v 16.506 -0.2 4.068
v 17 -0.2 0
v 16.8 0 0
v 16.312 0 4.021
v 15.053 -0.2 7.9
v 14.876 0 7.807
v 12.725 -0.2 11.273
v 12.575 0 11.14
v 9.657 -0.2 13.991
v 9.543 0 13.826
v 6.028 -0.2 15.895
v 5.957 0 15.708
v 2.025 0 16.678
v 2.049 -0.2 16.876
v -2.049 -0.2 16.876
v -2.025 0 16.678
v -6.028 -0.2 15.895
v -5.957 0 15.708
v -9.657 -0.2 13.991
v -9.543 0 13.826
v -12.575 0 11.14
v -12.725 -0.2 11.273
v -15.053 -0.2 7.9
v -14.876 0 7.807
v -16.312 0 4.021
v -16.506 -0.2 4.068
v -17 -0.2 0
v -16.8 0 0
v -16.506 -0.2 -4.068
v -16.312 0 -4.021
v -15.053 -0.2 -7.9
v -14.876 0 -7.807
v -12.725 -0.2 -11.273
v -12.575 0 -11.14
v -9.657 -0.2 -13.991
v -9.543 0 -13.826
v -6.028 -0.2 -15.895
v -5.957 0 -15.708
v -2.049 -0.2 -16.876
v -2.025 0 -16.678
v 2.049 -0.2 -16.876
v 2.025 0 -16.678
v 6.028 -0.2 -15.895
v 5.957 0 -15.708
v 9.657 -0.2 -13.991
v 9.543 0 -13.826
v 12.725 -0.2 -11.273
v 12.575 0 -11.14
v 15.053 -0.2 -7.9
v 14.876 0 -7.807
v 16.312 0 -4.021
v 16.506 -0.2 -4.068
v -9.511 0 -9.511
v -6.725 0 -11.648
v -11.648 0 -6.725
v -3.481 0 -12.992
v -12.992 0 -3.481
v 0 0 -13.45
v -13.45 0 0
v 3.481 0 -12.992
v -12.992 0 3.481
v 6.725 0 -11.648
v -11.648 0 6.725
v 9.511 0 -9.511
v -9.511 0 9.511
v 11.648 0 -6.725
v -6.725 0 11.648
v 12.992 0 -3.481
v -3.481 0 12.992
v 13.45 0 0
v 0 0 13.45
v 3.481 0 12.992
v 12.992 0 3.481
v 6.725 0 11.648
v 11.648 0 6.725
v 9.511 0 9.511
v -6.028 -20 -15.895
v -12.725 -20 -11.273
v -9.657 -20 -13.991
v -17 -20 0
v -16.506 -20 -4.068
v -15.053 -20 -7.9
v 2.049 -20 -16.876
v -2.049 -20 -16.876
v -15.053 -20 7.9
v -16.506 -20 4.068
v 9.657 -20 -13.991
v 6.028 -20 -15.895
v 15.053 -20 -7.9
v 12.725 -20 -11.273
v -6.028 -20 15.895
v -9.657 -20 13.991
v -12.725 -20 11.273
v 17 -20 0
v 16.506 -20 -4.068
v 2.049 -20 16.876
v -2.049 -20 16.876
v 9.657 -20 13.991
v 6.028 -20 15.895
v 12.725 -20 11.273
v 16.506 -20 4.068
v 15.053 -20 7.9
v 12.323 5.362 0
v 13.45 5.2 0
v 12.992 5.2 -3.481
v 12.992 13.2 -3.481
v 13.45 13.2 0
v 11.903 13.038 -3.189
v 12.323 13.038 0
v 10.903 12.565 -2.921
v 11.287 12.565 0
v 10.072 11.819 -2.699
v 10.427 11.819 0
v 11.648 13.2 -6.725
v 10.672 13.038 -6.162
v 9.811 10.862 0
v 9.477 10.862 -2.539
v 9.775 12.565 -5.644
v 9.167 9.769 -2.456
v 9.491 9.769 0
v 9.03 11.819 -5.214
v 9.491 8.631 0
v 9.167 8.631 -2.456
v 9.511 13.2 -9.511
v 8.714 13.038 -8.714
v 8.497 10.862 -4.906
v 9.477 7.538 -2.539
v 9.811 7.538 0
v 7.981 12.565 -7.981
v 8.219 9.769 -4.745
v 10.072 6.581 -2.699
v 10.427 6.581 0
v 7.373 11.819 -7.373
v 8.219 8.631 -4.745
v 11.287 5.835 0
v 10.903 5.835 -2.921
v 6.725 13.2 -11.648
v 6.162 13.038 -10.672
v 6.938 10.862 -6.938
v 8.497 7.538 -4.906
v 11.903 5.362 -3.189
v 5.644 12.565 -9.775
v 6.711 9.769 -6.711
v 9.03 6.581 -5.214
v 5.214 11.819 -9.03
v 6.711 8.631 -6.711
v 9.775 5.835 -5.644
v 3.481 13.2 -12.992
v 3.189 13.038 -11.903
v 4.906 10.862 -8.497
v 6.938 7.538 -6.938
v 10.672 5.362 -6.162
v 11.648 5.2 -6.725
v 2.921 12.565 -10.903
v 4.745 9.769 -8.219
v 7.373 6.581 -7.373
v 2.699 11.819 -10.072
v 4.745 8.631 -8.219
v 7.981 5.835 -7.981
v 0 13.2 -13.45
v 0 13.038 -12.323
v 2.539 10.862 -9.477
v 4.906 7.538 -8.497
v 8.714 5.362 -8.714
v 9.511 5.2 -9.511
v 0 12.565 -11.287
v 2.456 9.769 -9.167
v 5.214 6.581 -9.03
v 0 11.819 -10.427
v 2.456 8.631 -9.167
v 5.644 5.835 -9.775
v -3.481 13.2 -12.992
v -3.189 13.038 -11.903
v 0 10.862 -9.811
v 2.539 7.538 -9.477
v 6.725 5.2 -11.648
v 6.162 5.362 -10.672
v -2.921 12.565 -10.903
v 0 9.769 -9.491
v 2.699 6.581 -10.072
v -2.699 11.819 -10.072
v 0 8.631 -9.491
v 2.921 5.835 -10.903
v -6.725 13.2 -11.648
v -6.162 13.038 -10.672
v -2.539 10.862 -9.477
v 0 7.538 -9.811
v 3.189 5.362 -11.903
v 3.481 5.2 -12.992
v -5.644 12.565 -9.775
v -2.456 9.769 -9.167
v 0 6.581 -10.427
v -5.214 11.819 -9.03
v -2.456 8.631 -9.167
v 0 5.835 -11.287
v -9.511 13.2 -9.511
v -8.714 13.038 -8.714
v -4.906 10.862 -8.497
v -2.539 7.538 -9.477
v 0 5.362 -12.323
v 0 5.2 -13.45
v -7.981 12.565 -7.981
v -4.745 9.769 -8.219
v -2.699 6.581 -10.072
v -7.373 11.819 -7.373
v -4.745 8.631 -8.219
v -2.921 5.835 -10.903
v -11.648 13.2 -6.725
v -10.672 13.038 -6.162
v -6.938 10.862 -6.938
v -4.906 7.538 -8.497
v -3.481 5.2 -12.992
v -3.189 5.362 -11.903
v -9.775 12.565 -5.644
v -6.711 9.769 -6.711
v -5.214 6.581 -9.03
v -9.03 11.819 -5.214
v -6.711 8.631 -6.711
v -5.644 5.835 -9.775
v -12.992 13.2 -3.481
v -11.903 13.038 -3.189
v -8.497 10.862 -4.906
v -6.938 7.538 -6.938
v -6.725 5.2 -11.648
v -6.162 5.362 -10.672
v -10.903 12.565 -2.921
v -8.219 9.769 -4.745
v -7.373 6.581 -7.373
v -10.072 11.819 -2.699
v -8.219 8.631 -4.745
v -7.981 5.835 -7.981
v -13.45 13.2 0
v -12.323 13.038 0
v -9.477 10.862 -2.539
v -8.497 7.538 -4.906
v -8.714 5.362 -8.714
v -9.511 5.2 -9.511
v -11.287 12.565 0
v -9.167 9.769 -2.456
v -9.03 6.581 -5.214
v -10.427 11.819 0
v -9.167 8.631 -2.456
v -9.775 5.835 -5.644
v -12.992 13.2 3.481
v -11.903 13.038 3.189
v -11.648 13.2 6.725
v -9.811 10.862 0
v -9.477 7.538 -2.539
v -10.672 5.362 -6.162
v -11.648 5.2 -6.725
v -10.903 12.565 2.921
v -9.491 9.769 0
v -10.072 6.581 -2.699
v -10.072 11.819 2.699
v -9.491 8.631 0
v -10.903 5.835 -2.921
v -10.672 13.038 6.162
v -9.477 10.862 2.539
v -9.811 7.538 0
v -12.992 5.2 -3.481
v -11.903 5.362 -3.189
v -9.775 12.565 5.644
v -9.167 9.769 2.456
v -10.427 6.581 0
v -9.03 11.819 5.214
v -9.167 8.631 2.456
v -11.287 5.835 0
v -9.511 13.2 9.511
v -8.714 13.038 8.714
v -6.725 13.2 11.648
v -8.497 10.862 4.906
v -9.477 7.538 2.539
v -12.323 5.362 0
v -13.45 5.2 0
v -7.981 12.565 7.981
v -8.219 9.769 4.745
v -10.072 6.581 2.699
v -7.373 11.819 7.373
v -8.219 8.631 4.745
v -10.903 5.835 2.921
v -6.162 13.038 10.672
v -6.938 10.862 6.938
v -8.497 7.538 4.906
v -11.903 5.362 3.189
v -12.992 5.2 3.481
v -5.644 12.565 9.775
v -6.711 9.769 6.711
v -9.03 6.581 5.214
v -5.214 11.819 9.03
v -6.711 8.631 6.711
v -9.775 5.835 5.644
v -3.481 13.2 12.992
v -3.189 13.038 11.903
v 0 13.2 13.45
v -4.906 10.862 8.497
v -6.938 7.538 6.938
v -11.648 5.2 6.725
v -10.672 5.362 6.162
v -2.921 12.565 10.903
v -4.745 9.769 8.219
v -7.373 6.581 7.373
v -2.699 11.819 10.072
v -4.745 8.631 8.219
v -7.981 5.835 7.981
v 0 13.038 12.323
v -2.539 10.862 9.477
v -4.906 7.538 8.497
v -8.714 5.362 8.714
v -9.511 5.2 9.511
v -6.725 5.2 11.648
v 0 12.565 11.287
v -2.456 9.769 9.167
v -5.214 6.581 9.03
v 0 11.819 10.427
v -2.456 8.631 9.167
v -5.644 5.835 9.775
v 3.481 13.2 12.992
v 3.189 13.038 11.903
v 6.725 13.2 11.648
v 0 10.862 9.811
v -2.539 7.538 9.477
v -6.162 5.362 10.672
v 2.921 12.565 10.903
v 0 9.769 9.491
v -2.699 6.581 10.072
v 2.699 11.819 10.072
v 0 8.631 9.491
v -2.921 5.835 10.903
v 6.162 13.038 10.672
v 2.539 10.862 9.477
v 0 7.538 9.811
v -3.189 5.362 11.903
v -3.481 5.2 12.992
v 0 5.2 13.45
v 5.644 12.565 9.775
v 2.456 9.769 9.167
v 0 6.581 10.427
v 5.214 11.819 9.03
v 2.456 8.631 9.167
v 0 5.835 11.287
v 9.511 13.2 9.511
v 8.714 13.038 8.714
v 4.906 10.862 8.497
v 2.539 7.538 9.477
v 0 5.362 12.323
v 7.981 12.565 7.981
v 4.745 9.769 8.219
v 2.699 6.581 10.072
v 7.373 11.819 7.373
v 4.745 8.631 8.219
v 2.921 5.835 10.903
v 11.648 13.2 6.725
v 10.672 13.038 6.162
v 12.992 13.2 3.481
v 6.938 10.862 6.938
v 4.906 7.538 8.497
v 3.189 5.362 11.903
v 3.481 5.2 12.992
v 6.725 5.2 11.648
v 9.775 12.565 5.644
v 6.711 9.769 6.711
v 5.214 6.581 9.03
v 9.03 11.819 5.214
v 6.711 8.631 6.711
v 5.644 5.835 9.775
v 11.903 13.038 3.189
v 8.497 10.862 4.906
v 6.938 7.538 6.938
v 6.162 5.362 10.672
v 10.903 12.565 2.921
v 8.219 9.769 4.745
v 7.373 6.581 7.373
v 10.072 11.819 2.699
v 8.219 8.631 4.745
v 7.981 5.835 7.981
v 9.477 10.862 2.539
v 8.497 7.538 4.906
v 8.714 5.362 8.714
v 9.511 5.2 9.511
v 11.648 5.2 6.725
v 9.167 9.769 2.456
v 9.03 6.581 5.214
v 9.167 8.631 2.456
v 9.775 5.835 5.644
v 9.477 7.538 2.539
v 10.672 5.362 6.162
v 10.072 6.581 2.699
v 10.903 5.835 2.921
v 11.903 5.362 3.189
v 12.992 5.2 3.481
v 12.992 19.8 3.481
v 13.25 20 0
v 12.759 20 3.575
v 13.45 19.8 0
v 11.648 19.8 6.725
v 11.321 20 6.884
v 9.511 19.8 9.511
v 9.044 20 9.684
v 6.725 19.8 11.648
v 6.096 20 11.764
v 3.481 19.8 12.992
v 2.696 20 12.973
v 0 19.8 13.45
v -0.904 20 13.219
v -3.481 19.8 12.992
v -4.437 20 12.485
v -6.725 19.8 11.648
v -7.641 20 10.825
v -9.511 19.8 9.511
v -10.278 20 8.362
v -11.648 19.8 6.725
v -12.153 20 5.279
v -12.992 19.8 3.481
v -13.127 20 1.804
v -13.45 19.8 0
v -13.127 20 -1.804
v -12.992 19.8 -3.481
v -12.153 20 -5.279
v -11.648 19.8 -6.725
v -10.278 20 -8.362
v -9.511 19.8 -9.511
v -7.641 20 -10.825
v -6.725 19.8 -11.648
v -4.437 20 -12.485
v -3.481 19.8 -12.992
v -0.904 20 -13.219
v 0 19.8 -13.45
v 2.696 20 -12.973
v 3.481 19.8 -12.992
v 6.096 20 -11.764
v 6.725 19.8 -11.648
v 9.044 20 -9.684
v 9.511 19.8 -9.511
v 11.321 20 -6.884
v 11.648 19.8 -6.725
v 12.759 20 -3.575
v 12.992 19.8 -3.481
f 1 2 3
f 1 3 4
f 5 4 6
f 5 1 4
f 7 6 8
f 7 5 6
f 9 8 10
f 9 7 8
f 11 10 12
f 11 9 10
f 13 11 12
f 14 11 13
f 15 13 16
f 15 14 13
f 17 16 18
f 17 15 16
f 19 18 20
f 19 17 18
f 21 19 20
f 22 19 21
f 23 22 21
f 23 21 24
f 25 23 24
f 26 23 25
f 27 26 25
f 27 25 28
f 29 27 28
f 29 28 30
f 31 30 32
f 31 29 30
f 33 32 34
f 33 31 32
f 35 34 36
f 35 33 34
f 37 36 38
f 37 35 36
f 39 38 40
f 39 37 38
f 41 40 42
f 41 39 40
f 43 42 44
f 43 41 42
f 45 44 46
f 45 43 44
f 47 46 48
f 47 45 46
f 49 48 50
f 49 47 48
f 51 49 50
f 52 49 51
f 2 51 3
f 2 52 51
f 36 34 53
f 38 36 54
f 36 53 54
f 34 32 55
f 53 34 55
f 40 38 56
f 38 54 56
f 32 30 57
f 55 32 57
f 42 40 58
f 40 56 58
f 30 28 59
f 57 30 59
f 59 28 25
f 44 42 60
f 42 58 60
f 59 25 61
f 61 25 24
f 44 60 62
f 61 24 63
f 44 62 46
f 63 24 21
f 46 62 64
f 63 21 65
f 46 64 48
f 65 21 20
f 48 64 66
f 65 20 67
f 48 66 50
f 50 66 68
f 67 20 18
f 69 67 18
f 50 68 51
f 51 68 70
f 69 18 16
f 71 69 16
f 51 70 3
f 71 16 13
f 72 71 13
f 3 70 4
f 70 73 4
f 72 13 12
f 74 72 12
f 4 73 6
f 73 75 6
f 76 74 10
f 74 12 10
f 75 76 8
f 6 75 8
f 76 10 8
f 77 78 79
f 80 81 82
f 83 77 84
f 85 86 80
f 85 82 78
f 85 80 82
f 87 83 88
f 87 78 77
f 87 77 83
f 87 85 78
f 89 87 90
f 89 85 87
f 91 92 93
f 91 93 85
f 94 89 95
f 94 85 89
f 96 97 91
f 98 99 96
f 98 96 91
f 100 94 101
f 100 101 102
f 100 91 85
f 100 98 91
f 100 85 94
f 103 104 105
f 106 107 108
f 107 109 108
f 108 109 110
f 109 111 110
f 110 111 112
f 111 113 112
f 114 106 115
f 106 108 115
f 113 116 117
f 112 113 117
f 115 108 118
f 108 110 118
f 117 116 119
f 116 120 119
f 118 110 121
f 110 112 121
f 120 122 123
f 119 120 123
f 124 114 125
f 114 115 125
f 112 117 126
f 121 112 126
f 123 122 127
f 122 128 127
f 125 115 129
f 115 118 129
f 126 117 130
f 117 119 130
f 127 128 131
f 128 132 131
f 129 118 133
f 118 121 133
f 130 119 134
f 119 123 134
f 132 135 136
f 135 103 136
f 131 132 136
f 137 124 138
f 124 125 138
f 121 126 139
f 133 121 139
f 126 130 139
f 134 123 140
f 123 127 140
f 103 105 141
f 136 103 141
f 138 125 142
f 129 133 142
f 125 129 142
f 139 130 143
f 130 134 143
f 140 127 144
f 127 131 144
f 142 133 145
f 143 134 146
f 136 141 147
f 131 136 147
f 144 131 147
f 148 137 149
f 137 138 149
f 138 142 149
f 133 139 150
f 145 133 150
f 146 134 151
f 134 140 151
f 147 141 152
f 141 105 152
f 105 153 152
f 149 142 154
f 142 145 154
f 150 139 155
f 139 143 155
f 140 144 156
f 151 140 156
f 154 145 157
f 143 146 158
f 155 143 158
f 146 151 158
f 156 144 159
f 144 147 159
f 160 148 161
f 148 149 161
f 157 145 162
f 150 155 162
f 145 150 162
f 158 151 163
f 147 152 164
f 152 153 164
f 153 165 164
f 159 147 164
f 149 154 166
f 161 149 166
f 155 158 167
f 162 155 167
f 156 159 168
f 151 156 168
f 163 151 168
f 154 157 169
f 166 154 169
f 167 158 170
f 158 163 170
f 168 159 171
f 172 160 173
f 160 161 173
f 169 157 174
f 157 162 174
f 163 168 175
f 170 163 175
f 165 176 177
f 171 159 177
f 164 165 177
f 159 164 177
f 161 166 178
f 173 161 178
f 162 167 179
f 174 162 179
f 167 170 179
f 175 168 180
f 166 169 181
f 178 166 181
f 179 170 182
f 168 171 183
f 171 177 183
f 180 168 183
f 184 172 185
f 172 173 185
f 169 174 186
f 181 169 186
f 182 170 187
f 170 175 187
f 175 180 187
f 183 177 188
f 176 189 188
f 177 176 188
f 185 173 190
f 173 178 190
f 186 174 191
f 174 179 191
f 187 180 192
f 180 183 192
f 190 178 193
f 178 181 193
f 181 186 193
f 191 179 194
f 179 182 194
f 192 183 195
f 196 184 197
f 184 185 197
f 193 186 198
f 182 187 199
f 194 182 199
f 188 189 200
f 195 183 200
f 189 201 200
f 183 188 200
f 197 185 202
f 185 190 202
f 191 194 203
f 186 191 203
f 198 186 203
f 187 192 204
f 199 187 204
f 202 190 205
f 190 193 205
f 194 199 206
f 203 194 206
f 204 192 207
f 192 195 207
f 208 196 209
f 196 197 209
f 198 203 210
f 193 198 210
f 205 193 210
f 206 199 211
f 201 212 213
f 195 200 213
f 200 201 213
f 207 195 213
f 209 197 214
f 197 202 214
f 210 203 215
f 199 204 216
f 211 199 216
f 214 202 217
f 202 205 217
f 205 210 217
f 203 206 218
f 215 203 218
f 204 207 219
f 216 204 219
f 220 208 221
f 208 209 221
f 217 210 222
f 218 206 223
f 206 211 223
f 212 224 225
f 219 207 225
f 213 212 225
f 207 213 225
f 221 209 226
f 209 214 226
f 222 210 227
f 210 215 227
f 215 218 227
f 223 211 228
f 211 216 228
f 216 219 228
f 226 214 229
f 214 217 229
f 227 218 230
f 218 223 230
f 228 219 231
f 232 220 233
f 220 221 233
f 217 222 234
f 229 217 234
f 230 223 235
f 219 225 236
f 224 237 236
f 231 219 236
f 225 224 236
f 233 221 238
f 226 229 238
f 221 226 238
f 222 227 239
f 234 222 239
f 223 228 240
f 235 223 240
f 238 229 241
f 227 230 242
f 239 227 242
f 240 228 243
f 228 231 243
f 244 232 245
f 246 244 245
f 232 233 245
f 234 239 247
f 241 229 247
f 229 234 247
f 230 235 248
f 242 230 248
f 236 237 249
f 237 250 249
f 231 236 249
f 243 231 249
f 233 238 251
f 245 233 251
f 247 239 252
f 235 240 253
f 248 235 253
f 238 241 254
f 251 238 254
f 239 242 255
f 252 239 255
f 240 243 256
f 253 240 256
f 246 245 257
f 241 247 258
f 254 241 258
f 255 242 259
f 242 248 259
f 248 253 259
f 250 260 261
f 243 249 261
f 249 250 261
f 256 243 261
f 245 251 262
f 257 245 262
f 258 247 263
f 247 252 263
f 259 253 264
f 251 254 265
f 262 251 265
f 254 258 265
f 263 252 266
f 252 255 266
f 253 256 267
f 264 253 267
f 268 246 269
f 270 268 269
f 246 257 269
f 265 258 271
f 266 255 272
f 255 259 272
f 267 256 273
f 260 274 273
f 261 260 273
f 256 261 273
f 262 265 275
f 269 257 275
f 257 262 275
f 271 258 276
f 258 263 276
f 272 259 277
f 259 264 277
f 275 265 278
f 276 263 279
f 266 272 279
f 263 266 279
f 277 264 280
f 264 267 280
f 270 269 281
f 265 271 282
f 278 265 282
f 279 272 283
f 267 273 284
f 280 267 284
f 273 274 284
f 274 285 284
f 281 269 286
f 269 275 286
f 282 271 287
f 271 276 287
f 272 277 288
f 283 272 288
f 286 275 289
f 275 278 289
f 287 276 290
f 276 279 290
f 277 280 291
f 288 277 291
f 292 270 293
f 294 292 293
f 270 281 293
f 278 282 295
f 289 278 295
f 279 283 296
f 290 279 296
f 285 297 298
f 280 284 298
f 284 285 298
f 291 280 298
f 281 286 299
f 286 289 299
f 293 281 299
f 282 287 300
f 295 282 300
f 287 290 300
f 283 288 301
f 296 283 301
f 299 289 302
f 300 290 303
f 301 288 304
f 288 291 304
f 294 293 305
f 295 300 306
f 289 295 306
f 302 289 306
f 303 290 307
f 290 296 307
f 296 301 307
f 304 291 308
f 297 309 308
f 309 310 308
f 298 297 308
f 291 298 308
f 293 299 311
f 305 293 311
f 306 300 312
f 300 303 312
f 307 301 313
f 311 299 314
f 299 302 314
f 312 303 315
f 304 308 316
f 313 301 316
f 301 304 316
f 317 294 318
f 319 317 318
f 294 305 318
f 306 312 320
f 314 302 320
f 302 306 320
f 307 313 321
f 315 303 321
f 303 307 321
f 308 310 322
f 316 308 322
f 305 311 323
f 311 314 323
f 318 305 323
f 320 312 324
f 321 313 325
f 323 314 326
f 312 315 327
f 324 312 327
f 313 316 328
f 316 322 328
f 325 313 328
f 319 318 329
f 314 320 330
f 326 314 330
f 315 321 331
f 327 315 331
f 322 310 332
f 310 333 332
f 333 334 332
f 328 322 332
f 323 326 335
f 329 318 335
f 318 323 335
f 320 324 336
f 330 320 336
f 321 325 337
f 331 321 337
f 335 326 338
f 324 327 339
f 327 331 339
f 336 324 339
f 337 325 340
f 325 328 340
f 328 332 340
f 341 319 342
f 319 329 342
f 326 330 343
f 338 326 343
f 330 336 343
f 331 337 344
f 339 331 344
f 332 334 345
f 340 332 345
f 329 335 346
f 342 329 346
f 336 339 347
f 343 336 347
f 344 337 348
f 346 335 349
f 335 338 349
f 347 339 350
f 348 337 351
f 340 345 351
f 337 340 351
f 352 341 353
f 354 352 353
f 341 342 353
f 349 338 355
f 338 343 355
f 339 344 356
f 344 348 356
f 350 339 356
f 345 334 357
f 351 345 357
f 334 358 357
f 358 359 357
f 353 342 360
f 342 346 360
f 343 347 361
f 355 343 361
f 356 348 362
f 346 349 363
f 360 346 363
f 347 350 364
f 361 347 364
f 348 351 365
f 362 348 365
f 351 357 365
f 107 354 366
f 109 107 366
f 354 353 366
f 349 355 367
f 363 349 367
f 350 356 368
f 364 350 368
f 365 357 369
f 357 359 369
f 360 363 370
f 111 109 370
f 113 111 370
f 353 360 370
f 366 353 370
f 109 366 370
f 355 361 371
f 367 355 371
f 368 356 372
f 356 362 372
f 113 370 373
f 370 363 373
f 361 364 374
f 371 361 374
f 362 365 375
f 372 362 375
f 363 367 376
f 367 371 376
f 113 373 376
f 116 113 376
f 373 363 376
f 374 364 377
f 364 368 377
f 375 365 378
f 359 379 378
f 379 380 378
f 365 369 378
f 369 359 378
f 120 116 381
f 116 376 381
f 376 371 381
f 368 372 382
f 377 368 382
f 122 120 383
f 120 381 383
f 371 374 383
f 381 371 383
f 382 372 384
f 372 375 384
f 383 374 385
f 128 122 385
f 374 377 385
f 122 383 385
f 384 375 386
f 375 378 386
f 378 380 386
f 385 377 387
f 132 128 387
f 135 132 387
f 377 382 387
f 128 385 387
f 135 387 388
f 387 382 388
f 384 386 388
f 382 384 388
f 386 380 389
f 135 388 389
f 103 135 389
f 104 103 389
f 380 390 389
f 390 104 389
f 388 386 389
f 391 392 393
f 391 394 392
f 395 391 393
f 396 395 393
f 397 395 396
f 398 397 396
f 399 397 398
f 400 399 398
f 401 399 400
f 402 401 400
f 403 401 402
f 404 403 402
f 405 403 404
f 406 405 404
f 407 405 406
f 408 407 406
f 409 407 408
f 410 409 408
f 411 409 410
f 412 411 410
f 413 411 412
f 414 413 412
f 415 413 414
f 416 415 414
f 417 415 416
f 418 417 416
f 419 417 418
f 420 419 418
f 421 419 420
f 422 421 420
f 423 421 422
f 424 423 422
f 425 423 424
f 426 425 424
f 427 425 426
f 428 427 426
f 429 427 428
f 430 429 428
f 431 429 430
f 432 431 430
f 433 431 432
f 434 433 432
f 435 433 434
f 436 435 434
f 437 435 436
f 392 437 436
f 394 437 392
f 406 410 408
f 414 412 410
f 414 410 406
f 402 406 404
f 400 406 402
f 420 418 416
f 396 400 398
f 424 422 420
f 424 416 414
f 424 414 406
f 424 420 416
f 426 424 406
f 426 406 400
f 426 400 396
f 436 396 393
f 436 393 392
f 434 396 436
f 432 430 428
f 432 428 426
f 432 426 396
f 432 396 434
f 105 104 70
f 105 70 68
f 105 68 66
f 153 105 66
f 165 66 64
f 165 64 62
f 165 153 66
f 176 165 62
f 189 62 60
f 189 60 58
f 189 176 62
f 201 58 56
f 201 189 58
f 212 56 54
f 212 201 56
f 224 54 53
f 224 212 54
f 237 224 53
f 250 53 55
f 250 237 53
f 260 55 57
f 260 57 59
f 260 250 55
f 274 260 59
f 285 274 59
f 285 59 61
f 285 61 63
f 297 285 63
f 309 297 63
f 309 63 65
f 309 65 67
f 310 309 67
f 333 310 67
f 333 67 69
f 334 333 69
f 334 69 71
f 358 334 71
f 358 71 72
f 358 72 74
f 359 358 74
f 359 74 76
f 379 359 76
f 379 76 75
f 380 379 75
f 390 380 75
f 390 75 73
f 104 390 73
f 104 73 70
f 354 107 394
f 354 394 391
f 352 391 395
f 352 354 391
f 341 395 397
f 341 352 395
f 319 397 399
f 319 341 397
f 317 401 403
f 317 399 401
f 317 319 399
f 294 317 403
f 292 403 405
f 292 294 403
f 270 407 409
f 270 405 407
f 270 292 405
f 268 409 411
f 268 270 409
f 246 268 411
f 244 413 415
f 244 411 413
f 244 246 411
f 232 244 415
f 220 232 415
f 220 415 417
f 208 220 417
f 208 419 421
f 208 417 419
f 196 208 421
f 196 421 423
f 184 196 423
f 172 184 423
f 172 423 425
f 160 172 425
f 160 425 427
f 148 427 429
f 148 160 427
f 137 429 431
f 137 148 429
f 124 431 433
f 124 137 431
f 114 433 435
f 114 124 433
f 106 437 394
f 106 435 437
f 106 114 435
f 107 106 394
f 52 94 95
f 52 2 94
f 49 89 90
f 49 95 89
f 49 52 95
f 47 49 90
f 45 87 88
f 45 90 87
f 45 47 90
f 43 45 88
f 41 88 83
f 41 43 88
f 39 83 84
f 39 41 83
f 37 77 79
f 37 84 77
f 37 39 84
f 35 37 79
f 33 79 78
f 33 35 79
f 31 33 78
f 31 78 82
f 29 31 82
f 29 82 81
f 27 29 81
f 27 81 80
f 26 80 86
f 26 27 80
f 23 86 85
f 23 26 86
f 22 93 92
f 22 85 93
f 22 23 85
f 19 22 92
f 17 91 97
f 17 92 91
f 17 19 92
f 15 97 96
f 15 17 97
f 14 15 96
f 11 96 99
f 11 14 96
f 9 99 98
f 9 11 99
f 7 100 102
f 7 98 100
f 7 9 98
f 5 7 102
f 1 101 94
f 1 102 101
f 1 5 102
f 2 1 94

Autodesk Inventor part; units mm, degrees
ref_plane "YZ Plane" through (0, 0, 0) normal (1, 0, 0) x (0, 1, 0)
ref_plane "XZ Plane" through (0, 0, 0) normal (0, 1, 0) x (-1, 0, 0)
ref_plane "XY Plane" through (0, 0, 0) normal (0, 0, 1) x (1, 0, 0)
sketch "Sketch1" plane through (0, 0, 0) normal (0, 0, 1) x (1, 0, 0)
  line L0 (0, 0) -> (0, 20)
  line L1 (0, 20) -> (13.45, 20)
  line L2 (13.45, 20) -> (13.45, 13.2)
  line L3 (0, 0) -> (13.45, 0)
  line L4 (13.45, 0) -> (13.45, 5.2)
  arc A0 (13.45, 13.2) -> (13.45, 5.2) centre (13.45, 9.2) ccw
  dimension "d0" = 20
  dimension "d1" = 13.45
  dimension "d2" = 6.8
  dimension "d3" = 13.45
  dimension "d4" = 8
  dimension "d5" = 4
revolve "Revolution1" add sketch "Sketch1" angle 360 about axis through (0, 0, 0) along (0, 1, 0)
chamfer "Chamfer1" distance 0.2 angle 45 1 edges at (-13.45, 20, 0)
sketch "Sketch2" plane through (0, 0, 0) normal (0, -1, 0) x (1, 0, 0)
  circle A0 centre (0, 0) radius 13.45 projected
  circle A1 centre (0, 0) radius 17
  dimension "d10" = 34
extrude "Extrusion1" add sketch "Sketch2" along normal blind 20 contours A0 | A1
chamfer "Chamfer2" distance 0.2 angle 45 1 edges at (-17, 0, 0)
properties part number "slik_clamp_head38_stud"
